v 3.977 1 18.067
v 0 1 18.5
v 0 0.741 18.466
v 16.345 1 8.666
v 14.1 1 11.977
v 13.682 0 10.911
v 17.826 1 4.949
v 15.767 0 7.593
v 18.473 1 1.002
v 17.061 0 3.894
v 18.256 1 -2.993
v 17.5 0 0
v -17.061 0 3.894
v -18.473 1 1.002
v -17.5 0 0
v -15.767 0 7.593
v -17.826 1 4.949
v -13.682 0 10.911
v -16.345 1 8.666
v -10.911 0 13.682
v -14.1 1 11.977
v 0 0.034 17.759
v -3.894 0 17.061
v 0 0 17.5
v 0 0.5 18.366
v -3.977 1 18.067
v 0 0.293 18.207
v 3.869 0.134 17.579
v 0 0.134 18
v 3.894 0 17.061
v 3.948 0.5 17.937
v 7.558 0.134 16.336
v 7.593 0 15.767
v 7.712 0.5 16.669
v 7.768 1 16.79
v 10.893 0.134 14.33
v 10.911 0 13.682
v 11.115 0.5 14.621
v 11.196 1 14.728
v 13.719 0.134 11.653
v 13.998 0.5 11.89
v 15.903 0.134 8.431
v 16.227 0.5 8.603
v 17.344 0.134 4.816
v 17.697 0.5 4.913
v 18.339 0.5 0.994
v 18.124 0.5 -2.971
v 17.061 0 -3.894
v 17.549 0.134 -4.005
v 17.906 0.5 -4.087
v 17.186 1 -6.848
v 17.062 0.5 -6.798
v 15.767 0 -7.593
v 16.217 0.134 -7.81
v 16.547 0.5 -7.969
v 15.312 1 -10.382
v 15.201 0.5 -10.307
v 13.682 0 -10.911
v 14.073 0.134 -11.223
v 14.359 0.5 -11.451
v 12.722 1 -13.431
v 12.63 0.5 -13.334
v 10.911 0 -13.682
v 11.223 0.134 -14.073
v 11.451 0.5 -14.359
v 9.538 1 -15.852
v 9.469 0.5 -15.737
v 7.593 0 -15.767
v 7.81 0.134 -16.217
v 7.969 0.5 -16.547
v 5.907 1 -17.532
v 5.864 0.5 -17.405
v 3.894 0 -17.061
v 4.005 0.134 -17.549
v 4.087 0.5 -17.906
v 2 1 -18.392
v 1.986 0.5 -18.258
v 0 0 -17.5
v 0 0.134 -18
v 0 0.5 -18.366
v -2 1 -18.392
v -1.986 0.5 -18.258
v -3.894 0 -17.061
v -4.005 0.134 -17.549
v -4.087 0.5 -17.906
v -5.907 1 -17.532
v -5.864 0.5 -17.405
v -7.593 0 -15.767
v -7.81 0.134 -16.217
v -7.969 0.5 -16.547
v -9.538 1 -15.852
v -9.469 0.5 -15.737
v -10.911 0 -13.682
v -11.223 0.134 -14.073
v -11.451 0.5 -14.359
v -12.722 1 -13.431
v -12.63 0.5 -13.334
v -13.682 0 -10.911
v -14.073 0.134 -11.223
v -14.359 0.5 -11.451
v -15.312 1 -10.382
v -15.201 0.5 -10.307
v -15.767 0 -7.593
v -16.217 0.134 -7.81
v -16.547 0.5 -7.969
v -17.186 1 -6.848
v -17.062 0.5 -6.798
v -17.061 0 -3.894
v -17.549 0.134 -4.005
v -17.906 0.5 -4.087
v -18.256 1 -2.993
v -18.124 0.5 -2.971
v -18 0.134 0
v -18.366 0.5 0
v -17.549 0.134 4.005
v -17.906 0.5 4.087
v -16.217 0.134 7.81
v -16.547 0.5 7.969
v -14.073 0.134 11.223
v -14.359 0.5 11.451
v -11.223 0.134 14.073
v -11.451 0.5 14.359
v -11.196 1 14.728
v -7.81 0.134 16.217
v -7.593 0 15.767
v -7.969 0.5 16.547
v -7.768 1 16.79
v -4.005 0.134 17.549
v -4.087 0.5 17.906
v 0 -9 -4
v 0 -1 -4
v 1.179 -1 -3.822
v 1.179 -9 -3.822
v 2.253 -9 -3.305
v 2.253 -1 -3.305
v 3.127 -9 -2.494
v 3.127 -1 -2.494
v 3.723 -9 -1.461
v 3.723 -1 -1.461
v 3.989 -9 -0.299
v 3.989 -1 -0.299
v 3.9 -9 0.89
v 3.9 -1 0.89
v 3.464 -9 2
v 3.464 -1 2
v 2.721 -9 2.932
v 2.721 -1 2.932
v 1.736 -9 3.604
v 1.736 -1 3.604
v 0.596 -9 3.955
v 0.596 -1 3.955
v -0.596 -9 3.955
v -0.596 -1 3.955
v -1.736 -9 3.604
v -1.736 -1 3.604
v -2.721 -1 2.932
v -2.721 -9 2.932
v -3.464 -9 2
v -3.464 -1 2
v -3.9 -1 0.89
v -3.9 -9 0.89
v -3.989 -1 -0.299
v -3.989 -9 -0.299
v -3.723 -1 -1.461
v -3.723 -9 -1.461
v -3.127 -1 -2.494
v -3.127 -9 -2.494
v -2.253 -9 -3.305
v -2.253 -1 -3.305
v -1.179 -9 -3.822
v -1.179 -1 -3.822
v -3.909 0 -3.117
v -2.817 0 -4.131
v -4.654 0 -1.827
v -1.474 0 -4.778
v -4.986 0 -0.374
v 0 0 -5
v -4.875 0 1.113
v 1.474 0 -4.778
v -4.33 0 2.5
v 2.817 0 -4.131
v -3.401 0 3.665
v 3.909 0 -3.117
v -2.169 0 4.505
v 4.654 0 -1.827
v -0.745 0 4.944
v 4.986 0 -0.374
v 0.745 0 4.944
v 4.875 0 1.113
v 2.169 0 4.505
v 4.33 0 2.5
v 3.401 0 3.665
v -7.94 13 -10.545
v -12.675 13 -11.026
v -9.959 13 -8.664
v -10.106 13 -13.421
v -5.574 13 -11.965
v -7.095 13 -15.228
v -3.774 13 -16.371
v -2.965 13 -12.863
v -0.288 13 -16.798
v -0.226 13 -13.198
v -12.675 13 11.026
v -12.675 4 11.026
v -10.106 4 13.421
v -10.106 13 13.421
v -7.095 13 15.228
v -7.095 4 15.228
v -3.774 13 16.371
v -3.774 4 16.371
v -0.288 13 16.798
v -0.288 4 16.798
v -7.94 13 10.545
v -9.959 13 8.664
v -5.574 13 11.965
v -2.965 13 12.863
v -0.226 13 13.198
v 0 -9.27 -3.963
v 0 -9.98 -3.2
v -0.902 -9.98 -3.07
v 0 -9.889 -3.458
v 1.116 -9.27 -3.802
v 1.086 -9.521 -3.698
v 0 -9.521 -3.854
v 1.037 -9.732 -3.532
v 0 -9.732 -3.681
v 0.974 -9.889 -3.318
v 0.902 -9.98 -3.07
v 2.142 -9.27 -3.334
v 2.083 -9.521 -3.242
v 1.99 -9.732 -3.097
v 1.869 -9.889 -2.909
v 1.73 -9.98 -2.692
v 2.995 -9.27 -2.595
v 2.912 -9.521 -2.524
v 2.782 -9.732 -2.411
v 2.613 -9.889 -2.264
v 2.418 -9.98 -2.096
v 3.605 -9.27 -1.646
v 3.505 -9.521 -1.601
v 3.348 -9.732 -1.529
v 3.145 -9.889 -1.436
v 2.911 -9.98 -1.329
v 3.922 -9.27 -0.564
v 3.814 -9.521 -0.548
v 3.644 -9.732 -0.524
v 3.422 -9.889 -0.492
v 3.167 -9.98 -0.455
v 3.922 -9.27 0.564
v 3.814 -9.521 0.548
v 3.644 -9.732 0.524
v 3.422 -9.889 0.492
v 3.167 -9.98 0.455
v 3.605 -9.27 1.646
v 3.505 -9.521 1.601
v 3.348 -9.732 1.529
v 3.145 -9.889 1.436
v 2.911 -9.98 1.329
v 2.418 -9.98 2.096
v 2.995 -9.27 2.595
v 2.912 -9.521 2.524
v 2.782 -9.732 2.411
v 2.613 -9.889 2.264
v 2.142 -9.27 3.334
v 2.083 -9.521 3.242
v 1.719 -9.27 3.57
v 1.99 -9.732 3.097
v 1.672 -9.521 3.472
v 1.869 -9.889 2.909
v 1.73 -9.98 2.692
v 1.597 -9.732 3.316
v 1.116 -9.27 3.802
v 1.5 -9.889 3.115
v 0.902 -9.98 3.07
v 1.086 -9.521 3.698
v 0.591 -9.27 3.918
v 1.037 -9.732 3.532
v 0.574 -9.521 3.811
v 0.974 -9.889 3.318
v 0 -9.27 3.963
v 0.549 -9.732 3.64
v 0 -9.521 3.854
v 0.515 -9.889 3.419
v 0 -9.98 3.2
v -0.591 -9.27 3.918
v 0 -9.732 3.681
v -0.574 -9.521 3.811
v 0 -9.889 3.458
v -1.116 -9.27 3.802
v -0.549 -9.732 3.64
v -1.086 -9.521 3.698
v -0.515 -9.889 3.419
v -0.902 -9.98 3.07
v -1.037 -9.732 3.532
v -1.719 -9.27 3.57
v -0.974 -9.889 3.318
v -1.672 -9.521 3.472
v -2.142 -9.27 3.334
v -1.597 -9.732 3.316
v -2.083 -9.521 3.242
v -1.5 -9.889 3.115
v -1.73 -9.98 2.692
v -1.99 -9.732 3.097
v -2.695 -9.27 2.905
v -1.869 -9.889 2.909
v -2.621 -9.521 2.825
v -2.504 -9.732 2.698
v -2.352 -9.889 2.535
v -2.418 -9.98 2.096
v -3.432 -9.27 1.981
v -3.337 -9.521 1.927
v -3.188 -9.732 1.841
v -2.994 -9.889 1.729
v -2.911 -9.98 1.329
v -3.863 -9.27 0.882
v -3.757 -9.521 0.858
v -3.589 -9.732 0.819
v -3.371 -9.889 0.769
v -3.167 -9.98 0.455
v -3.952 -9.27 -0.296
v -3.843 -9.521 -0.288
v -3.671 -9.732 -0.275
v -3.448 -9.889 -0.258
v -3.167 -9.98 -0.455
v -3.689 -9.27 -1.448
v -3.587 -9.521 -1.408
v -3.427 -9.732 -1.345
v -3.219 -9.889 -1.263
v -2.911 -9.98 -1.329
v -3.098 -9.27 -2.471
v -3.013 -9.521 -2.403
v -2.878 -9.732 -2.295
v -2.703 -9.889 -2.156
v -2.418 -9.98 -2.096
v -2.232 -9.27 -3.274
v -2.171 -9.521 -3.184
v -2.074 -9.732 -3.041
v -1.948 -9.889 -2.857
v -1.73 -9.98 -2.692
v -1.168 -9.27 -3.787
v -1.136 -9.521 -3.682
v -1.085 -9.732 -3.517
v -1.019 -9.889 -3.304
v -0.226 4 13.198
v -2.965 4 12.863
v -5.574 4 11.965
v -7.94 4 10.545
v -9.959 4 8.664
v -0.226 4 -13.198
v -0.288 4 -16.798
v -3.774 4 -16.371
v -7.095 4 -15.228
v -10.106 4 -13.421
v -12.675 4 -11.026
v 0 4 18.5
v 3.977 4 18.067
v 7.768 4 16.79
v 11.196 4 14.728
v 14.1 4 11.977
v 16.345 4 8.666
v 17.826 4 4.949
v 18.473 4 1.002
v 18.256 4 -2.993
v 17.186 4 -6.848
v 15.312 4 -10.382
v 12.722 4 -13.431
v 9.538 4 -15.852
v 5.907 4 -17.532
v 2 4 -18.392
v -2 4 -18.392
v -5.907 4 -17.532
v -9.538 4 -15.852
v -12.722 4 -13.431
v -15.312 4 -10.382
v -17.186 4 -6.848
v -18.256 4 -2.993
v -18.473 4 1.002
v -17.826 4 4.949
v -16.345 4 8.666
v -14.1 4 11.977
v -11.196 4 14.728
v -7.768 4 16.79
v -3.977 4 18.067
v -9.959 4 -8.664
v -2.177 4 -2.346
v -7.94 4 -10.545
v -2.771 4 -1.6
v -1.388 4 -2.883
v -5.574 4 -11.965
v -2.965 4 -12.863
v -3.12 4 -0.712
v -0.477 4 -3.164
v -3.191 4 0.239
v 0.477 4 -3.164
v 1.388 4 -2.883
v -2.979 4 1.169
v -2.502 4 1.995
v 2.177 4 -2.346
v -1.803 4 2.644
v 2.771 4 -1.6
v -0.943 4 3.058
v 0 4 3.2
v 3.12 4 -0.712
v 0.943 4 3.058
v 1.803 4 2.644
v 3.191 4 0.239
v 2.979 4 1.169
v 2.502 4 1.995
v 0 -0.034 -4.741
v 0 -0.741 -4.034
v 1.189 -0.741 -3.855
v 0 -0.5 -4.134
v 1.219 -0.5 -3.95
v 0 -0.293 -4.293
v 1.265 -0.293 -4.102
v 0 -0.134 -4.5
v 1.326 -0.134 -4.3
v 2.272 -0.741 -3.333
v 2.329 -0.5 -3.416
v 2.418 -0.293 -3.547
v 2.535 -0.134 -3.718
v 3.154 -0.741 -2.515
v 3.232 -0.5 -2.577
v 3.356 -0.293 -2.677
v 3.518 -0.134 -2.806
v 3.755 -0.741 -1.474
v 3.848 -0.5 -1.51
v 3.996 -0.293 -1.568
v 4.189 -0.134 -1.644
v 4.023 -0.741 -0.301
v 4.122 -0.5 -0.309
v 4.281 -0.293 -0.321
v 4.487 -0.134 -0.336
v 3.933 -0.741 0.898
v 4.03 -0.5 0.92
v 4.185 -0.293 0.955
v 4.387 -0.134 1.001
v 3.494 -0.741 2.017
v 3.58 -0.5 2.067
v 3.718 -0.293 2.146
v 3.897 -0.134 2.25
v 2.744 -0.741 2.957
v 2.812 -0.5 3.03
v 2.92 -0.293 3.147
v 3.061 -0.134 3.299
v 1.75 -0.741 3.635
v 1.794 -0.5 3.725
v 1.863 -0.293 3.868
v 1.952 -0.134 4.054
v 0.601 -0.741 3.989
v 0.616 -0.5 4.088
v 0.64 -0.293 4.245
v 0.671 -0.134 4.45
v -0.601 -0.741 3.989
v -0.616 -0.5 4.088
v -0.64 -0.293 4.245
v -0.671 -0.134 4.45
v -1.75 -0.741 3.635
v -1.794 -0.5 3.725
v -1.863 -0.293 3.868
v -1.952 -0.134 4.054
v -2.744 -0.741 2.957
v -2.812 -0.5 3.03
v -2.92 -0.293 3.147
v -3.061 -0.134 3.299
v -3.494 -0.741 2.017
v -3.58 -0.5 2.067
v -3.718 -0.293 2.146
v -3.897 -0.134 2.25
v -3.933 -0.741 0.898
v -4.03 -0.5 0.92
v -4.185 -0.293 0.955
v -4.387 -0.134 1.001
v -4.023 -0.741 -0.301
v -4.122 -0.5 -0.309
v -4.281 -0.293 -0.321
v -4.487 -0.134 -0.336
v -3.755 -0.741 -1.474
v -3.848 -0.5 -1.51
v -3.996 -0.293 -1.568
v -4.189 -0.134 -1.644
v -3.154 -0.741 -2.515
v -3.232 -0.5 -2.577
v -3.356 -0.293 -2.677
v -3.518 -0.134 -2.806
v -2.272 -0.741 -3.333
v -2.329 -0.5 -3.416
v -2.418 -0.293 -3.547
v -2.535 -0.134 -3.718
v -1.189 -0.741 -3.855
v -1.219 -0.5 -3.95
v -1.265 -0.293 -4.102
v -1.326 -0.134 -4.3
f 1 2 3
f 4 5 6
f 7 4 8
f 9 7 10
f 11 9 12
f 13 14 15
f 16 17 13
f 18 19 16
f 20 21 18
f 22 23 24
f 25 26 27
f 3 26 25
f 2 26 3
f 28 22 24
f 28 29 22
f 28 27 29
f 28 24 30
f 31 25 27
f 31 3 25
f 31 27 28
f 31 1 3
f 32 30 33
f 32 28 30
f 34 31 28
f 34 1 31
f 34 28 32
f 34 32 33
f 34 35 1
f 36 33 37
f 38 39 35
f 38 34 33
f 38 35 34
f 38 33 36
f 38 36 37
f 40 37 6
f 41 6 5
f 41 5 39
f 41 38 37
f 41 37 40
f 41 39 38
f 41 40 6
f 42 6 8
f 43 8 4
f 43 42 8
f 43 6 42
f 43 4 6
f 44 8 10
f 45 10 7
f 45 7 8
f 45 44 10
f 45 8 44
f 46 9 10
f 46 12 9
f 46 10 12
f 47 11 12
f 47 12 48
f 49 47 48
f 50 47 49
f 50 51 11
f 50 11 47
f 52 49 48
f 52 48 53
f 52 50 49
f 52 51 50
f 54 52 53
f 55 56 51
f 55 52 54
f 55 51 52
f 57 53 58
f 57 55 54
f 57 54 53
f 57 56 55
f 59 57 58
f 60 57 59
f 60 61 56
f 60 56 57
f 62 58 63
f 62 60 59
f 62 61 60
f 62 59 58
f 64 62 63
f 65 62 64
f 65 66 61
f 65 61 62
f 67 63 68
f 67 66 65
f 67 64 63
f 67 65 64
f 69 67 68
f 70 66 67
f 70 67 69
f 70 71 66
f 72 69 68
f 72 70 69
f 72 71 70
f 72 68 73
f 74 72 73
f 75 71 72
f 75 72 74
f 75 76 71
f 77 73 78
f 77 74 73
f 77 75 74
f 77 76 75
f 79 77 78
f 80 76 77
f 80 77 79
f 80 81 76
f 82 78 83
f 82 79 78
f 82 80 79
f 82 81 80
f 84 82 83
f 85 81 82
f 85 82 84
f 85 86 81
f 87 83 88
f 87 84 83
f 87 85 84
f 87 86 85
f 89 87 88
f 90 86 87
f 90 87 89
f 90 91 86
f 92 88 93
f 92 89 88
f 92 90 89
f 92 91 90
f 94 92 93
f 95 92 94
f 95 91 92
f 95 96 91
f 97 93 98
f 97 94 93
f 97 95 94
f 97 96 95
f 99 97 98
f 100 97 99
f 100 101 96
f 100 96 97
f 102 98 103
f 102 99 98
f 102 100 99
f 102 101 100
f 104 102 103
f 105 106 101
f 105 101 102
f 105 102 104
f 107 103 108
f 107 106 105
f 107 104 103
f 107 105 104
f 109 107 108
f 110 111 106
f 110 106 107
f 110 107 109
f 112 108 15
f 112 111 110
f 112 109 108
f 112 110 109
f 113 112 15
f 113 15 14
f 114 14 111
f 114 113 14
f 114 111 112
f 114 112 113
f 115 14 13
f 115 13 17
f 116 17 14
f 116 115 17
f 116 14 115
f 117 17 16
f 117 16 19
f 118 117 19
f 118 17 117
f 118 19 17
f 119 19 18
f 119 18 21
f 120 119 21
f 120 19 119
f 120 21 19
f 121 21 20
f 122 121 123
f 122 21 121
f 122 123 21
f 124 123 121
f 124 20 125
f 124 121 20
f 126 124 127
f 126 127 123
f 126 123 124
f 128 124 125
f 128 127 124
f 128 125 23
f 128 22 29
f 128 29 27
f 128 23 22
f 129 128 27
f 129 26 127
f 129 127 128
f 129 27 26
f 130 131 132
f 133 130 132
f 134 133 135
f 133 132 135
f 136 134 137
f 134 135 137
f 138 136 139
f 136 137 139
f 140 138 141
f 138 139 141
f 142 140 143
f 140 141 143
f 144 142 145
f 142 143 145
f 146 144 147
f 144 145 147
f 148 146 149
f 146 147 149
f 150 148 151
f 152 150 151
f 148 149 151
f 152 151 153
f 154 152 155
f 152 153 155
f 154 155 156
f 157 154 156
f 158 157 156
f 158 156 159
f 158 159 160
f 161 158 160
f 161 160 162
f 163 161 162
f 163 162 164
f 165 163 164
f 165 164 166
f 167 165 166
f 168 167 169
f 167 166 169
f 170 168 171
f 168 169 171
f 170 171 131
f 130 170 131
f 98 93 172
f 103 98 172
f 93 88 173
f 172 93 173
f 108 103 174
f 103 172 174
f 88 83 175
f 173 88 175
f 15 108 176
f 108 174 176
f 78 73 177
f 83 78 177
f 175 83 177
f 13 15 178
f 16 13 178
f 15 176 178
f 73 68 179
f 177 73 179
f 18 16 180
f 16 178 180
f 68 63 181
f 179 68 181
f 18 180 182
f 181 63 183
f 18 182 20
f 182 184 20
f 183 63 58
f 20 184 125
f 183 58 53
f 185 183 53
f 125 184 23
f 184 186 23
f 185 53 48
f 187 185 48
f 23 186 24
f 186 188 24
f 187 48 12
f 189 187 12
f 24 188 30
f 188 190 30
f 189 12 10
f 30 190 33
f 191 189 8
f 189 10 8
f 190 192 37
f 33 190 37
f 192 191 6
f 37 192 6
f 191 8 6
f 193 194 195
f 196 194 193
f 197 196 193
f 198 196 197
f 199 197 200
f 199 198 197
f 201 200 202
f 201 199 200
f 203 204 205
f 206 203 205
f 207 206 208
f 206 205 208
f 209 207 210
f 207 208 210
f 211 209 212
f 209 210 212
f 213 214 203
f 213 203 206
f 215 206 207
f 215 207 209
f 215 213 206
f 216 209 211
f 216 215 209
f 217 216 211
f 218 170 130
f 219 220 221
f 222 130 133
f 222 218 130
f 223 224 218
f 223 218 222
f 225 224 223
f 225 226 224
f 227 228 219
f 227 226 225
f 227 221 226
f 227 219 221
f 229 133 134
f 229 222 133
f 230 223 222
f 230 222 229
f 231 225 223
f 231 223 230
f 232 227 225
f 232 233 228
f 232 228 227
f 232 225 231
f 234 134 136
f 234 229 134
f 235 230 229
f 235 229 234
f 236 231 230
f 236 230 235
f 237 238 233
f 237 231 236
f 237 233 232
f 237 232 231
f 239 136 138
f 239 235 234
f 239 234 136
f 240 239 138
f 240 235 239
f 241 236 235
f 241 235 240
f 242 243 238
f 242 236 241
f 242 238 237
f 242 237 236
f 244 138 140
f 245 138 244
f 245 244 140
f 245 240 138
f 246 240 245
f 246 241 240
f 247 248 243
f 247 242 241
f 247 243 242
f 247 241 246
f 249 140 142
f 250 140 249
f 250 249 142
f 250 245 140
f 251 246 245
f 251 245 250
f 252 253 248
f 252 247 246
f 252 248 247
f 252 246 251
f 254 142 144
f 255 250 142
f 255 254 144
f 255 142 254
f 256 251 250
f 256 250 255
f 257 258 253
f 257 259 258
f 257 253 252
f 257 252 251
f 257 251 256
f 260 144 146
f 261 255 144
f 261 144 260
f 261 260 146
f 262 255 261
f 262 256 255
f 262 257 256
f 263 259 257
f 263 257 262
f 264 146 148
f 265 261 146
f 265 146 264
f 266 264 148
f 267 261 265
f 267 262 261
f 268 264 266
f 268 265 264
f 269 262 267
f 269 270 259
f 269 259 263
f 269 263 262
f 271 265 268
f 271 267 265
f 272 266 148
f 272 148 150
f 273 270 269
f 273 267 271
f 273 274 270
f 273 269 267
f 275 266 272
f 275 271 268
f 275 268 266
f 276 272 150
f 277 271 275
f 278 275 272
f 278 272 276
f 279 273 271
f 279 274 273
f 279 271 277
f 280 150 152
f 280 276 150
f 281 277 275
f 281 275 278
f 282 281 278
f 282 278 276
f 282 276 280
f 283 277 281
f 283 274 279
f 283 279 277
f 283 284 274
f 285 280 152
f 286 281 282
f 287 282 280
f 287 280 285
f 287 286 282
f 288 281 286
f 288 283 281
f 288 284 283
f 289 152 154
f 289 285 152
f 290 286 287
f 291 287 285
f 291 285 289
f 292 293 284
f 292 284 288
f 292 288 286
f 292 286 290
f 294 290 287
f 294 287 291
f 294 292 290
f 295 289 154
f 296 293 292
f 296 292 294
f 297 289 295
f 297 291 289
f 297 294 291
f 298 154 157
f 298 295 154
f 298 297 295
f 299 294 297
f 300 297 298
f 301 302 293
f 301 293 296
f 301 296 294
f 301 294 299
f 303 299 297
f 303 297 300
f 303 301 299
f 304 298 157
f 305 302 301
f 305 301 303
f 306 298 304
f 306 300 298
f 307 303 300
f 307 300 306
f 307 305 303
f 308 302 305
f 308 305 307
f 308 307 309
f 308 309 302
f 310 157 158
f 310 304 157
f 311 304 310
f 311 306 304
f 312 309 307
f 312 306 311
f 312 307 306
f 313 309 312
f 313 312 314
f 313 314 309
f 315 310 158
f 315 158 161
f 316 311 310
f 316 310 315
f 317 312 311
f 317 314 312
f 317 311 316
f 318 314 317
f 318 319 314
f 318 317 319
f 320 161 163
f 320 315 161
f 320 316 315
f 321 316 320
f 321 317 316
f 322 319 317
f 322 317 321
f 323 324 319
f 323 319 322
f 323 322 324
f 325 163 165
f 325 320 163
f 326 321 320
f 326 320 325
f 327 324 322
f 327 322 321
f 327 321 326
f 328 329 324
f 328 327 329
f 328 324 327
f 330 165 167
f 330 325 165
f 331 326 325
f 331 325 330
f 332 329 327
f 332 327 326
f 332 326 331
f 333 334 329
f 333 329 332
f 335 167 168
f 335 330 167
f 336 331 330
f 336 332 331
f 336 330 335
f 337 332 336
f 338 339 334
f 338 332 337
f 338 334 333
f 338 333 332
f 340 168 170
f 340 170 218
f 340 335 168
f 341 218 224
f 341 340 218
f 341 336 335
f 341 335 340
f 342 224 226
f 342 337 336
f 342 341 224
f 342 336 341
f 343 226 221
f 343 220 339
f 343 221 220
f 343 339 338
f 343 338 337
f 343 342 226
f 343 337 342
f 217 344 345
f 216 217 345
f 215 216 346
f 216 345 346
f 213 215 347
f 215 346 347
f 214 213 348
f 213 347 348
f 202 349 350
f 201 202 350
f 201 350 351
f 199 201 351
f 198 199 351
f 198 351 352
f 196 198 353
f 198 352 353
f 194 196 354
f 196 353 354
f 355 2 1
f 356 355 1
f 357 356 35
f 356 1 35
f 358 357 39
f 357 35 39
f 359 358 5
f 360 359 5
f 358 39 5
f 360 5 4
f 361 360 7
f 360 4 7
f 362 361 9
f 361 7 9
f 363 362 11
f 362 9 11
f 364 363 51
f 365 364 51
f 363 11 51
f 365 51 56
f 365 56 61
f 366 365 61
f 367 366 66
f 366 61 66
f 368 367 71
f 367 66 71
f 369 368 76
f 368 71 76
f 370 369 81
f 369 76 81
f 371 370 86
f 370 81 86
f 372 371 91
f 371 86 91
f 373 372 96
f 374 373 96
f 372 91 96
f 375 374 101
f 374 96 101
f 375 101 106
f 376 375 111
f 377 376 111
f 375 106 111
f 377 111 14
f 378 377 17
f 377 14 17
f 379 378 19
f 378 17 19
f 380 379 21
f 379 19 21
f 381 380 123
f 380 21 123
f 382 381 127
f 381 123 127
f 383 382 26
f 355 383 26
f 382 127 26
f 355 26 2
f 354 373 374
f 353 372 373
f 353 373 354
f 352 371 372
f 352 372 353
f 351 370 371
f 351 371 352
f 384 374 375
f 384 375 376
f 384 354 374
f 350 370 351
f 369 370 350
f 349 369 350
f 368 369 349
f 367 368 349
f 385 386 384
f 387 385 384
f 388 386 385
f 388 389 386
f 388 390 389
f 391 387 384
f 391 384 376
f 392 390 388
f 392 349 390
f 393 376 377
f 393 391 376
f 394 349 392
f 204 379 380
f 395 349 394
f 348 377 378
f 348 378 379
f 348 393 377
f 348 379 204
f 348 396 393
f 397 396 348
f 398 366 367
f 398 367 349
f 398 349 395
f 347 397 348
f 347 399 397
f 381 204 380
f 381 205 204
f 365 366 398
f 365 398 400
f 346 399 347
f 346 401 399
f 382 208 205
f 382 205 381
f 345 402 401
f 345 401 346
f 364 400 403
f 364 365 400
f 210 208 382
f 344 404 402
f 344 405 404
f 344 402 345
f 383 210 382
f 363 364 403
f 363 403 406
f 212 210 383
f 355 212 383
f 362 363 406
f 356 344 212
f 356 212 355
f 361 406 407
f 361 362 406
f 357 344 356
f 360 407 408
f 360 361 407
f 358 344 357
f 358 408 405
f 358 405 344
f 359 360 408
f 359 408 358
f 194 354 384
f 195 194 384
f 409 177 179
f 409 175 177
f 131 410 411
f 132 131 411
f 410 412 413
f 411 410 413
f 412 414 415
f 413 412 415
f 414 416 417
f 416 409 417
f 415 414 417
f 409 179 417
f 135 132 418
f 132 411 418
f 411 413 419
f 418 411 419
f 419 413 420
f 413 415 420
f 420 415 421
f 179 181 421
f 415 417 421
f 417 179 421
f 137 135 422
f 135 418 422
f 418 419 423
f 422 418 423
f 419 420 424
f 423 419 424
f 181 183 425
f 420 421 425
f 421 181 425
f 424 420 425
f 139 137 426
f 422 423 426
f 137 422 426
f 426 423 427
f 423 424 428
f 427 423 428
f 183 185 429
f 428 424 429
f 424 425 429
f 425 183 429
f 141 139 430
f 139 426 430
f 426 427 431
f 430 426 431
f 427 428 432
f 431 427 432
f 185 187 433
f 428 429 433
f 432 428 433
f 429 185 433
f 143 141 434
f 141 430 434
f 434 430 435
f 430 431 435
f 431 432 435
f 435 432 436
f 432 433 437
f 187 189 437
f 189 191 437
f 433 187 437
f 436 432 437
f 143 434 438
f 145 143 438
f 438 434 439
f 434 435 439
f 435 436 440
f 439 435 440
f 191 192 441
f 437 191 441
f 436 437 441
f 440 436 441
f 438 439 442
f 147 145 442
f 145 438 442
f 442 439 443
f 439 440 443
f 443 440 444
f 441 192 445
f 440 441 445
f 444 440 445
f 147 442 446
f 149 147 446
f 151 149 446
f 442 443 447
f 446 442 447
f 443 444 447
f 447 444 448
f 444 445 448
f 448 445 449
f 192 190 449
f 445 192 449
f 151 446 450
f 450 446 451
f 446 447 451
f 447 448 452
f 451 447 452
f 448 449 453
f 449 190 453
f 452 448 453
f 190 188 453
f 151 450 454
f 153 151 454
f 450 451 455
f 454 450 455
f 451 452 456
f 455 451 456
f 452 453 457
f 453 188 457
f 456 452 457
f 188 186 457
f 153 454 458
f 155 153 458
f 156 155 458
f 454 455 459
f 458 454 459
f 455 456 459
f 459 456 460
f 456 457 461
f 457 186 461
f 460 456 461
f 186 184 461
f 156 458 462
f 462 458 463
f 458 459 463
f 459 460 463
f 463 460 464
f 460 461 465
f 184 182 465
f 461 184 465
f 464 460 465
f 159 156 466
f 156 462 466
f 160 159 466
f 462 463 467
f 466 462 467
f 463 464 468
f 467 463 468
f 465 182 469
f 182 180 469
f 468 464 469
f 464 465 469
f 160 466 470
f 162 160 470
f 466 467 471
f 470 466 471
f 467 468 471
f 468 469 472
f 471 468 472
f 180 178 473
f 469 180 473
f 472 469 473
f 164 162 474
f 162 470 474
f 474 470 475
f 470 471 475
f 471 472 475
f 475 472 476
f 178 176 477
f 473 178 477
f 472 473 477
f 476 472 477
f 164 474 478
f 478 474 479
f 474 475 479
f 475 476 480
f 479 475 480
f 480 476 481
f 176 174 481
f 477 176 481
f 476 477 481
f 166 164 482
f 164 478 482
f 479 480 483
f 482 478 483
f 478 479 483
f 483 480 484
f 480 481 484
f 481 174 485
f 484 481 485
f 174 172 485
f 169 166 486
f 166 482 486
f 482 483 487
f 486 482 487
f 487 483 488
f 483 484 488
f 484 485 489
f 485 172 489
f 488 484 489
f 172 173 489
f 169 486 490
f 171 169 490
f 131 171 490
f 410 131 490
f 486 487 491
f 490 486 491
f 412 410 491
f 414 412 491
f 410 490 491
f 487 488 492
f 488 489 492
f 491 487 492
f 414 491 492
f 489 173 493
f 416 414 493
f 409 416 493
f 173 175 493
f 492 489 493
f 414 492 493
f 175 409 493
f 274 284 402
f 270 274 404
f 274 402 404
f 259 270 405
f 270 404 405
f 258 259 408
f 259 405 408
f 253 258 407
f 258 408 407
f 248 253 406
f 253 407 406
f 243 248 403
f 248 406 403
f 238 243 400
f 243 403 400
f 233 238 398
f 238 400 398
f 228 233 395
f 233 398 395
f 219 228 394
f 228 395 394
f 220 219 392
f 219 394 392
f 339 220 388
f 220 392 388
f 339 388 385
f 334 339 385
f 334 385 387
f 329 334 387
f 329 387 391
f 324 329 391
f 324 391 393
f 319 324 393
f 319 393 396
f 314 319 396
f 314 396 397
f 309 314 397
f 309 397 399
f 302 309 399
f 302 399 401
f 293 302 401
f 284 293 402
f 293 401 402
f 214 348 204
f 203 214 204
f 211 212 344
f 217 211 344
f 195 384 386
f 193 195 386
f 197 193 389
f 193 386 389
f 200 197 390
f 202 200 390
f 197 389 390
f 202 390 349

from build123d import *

# Parameters (mm, degrees)
SKETCH1_R           = 18.5
BOSS_EXTRUDE1_DEPTH = 4
SKETCH3_R           = 4
BOSS_EXTRUDE2_DEPTH = 10
FILLET1_R           = 1
FILLET2_R           = 1
BOSS_EXTRUDE3_DEPTH = 9
SKETCH5_R           = 3.2
CUT_EXTRUDE1_DEPTH  = 30.673220359


with BuildPart() as part:
    # Sketch1 → Boss-Extrude1 (new body)
    with BuildSketch(Plane(origin=(0, 0, 0), x_dir=(1, 0, 0), z_dir=(0, 1, 0))):
        Circle(SKETCH1_R)
    extrude(amount=BOSS_EXTRUDE1_DEPTH)

    # Sketch3 → Boss-Extrude2 (add)
    with BuildSketch(Plane.XZ):
        Circle(SKETCH3_R)
    extrude(amount=BOSS_EXTRUDE2_DEPTH)

    # Fillet1
    fillet1_edges = [part.edges().sort_by_distance(p)[0] for p in [
        (-4, -10, 0),
    ]]
    fillet(fillet1_edges, radius=FILLET1_R)

    # Fillet2
    fillet2_edges = [part.edges().sort_by_distance(p)[0] for p in [
        (-18.5, 0, 0),
        (-4, 0, 0),
    ]]
    fillet(fillet2_edges, radius=FILLET2_R)

    # Sketch4 → Boss-Extrude3 (add)
    with BuildSketch(Plane(origin=(0, 4, 0), x_dir=(1, 0, 0), z_dir=(0, 1, 0))):
        with BuildLine():
            Line((-12.675055994, 11.02646614), (-9.958972567, 8.663651967))
            ThreePointArc((-9.958972567, 8.663651967), (-5.574490656, 11.965160004), (-0.226257983, 13.198060741))
            Line((-0.226257983, 13.198060741), (-0.287964706, 16.797531852))
            ThreePointArc((-0.287964706, 16.797531852), (-7.094806289, 15.22838546), (-12.675055994, 11.02646614))
        make_face()
        with BuildLine():
            Line((-9.958972567, -8.663651967), (-12.675055994, -11.02646614))
            ThreePointArc((-12.675055994, -11.02646614), (-7.094806289, -15.22838546), (-0.287964706, -16.797531852))
            Line((-0.287964706, -16.797531852), (-0.226257983, -13.198060741))
            ThreePointArc((-0.226257983, -13.198060741), (-5.574490656, -11.965160004), (-9.958972567, -8.663651967))
        make_face()
    extrude(amount=BOSS_EXTRUDE3_DEPTH)

    # Sketch5 → Cut-Extrude1 (cut, through all)
    with BuildSketch(Plane(origin=(0, 4, 0), x_dir=(1, 0, 0), z_dir=(0, 1, 0))):
        Circle(SKETCH5_R)
    extrude(amount=-CUT_EXTRUDE1_DEPTH, mode=Mode.SUBTRACT)


solid = part.part
